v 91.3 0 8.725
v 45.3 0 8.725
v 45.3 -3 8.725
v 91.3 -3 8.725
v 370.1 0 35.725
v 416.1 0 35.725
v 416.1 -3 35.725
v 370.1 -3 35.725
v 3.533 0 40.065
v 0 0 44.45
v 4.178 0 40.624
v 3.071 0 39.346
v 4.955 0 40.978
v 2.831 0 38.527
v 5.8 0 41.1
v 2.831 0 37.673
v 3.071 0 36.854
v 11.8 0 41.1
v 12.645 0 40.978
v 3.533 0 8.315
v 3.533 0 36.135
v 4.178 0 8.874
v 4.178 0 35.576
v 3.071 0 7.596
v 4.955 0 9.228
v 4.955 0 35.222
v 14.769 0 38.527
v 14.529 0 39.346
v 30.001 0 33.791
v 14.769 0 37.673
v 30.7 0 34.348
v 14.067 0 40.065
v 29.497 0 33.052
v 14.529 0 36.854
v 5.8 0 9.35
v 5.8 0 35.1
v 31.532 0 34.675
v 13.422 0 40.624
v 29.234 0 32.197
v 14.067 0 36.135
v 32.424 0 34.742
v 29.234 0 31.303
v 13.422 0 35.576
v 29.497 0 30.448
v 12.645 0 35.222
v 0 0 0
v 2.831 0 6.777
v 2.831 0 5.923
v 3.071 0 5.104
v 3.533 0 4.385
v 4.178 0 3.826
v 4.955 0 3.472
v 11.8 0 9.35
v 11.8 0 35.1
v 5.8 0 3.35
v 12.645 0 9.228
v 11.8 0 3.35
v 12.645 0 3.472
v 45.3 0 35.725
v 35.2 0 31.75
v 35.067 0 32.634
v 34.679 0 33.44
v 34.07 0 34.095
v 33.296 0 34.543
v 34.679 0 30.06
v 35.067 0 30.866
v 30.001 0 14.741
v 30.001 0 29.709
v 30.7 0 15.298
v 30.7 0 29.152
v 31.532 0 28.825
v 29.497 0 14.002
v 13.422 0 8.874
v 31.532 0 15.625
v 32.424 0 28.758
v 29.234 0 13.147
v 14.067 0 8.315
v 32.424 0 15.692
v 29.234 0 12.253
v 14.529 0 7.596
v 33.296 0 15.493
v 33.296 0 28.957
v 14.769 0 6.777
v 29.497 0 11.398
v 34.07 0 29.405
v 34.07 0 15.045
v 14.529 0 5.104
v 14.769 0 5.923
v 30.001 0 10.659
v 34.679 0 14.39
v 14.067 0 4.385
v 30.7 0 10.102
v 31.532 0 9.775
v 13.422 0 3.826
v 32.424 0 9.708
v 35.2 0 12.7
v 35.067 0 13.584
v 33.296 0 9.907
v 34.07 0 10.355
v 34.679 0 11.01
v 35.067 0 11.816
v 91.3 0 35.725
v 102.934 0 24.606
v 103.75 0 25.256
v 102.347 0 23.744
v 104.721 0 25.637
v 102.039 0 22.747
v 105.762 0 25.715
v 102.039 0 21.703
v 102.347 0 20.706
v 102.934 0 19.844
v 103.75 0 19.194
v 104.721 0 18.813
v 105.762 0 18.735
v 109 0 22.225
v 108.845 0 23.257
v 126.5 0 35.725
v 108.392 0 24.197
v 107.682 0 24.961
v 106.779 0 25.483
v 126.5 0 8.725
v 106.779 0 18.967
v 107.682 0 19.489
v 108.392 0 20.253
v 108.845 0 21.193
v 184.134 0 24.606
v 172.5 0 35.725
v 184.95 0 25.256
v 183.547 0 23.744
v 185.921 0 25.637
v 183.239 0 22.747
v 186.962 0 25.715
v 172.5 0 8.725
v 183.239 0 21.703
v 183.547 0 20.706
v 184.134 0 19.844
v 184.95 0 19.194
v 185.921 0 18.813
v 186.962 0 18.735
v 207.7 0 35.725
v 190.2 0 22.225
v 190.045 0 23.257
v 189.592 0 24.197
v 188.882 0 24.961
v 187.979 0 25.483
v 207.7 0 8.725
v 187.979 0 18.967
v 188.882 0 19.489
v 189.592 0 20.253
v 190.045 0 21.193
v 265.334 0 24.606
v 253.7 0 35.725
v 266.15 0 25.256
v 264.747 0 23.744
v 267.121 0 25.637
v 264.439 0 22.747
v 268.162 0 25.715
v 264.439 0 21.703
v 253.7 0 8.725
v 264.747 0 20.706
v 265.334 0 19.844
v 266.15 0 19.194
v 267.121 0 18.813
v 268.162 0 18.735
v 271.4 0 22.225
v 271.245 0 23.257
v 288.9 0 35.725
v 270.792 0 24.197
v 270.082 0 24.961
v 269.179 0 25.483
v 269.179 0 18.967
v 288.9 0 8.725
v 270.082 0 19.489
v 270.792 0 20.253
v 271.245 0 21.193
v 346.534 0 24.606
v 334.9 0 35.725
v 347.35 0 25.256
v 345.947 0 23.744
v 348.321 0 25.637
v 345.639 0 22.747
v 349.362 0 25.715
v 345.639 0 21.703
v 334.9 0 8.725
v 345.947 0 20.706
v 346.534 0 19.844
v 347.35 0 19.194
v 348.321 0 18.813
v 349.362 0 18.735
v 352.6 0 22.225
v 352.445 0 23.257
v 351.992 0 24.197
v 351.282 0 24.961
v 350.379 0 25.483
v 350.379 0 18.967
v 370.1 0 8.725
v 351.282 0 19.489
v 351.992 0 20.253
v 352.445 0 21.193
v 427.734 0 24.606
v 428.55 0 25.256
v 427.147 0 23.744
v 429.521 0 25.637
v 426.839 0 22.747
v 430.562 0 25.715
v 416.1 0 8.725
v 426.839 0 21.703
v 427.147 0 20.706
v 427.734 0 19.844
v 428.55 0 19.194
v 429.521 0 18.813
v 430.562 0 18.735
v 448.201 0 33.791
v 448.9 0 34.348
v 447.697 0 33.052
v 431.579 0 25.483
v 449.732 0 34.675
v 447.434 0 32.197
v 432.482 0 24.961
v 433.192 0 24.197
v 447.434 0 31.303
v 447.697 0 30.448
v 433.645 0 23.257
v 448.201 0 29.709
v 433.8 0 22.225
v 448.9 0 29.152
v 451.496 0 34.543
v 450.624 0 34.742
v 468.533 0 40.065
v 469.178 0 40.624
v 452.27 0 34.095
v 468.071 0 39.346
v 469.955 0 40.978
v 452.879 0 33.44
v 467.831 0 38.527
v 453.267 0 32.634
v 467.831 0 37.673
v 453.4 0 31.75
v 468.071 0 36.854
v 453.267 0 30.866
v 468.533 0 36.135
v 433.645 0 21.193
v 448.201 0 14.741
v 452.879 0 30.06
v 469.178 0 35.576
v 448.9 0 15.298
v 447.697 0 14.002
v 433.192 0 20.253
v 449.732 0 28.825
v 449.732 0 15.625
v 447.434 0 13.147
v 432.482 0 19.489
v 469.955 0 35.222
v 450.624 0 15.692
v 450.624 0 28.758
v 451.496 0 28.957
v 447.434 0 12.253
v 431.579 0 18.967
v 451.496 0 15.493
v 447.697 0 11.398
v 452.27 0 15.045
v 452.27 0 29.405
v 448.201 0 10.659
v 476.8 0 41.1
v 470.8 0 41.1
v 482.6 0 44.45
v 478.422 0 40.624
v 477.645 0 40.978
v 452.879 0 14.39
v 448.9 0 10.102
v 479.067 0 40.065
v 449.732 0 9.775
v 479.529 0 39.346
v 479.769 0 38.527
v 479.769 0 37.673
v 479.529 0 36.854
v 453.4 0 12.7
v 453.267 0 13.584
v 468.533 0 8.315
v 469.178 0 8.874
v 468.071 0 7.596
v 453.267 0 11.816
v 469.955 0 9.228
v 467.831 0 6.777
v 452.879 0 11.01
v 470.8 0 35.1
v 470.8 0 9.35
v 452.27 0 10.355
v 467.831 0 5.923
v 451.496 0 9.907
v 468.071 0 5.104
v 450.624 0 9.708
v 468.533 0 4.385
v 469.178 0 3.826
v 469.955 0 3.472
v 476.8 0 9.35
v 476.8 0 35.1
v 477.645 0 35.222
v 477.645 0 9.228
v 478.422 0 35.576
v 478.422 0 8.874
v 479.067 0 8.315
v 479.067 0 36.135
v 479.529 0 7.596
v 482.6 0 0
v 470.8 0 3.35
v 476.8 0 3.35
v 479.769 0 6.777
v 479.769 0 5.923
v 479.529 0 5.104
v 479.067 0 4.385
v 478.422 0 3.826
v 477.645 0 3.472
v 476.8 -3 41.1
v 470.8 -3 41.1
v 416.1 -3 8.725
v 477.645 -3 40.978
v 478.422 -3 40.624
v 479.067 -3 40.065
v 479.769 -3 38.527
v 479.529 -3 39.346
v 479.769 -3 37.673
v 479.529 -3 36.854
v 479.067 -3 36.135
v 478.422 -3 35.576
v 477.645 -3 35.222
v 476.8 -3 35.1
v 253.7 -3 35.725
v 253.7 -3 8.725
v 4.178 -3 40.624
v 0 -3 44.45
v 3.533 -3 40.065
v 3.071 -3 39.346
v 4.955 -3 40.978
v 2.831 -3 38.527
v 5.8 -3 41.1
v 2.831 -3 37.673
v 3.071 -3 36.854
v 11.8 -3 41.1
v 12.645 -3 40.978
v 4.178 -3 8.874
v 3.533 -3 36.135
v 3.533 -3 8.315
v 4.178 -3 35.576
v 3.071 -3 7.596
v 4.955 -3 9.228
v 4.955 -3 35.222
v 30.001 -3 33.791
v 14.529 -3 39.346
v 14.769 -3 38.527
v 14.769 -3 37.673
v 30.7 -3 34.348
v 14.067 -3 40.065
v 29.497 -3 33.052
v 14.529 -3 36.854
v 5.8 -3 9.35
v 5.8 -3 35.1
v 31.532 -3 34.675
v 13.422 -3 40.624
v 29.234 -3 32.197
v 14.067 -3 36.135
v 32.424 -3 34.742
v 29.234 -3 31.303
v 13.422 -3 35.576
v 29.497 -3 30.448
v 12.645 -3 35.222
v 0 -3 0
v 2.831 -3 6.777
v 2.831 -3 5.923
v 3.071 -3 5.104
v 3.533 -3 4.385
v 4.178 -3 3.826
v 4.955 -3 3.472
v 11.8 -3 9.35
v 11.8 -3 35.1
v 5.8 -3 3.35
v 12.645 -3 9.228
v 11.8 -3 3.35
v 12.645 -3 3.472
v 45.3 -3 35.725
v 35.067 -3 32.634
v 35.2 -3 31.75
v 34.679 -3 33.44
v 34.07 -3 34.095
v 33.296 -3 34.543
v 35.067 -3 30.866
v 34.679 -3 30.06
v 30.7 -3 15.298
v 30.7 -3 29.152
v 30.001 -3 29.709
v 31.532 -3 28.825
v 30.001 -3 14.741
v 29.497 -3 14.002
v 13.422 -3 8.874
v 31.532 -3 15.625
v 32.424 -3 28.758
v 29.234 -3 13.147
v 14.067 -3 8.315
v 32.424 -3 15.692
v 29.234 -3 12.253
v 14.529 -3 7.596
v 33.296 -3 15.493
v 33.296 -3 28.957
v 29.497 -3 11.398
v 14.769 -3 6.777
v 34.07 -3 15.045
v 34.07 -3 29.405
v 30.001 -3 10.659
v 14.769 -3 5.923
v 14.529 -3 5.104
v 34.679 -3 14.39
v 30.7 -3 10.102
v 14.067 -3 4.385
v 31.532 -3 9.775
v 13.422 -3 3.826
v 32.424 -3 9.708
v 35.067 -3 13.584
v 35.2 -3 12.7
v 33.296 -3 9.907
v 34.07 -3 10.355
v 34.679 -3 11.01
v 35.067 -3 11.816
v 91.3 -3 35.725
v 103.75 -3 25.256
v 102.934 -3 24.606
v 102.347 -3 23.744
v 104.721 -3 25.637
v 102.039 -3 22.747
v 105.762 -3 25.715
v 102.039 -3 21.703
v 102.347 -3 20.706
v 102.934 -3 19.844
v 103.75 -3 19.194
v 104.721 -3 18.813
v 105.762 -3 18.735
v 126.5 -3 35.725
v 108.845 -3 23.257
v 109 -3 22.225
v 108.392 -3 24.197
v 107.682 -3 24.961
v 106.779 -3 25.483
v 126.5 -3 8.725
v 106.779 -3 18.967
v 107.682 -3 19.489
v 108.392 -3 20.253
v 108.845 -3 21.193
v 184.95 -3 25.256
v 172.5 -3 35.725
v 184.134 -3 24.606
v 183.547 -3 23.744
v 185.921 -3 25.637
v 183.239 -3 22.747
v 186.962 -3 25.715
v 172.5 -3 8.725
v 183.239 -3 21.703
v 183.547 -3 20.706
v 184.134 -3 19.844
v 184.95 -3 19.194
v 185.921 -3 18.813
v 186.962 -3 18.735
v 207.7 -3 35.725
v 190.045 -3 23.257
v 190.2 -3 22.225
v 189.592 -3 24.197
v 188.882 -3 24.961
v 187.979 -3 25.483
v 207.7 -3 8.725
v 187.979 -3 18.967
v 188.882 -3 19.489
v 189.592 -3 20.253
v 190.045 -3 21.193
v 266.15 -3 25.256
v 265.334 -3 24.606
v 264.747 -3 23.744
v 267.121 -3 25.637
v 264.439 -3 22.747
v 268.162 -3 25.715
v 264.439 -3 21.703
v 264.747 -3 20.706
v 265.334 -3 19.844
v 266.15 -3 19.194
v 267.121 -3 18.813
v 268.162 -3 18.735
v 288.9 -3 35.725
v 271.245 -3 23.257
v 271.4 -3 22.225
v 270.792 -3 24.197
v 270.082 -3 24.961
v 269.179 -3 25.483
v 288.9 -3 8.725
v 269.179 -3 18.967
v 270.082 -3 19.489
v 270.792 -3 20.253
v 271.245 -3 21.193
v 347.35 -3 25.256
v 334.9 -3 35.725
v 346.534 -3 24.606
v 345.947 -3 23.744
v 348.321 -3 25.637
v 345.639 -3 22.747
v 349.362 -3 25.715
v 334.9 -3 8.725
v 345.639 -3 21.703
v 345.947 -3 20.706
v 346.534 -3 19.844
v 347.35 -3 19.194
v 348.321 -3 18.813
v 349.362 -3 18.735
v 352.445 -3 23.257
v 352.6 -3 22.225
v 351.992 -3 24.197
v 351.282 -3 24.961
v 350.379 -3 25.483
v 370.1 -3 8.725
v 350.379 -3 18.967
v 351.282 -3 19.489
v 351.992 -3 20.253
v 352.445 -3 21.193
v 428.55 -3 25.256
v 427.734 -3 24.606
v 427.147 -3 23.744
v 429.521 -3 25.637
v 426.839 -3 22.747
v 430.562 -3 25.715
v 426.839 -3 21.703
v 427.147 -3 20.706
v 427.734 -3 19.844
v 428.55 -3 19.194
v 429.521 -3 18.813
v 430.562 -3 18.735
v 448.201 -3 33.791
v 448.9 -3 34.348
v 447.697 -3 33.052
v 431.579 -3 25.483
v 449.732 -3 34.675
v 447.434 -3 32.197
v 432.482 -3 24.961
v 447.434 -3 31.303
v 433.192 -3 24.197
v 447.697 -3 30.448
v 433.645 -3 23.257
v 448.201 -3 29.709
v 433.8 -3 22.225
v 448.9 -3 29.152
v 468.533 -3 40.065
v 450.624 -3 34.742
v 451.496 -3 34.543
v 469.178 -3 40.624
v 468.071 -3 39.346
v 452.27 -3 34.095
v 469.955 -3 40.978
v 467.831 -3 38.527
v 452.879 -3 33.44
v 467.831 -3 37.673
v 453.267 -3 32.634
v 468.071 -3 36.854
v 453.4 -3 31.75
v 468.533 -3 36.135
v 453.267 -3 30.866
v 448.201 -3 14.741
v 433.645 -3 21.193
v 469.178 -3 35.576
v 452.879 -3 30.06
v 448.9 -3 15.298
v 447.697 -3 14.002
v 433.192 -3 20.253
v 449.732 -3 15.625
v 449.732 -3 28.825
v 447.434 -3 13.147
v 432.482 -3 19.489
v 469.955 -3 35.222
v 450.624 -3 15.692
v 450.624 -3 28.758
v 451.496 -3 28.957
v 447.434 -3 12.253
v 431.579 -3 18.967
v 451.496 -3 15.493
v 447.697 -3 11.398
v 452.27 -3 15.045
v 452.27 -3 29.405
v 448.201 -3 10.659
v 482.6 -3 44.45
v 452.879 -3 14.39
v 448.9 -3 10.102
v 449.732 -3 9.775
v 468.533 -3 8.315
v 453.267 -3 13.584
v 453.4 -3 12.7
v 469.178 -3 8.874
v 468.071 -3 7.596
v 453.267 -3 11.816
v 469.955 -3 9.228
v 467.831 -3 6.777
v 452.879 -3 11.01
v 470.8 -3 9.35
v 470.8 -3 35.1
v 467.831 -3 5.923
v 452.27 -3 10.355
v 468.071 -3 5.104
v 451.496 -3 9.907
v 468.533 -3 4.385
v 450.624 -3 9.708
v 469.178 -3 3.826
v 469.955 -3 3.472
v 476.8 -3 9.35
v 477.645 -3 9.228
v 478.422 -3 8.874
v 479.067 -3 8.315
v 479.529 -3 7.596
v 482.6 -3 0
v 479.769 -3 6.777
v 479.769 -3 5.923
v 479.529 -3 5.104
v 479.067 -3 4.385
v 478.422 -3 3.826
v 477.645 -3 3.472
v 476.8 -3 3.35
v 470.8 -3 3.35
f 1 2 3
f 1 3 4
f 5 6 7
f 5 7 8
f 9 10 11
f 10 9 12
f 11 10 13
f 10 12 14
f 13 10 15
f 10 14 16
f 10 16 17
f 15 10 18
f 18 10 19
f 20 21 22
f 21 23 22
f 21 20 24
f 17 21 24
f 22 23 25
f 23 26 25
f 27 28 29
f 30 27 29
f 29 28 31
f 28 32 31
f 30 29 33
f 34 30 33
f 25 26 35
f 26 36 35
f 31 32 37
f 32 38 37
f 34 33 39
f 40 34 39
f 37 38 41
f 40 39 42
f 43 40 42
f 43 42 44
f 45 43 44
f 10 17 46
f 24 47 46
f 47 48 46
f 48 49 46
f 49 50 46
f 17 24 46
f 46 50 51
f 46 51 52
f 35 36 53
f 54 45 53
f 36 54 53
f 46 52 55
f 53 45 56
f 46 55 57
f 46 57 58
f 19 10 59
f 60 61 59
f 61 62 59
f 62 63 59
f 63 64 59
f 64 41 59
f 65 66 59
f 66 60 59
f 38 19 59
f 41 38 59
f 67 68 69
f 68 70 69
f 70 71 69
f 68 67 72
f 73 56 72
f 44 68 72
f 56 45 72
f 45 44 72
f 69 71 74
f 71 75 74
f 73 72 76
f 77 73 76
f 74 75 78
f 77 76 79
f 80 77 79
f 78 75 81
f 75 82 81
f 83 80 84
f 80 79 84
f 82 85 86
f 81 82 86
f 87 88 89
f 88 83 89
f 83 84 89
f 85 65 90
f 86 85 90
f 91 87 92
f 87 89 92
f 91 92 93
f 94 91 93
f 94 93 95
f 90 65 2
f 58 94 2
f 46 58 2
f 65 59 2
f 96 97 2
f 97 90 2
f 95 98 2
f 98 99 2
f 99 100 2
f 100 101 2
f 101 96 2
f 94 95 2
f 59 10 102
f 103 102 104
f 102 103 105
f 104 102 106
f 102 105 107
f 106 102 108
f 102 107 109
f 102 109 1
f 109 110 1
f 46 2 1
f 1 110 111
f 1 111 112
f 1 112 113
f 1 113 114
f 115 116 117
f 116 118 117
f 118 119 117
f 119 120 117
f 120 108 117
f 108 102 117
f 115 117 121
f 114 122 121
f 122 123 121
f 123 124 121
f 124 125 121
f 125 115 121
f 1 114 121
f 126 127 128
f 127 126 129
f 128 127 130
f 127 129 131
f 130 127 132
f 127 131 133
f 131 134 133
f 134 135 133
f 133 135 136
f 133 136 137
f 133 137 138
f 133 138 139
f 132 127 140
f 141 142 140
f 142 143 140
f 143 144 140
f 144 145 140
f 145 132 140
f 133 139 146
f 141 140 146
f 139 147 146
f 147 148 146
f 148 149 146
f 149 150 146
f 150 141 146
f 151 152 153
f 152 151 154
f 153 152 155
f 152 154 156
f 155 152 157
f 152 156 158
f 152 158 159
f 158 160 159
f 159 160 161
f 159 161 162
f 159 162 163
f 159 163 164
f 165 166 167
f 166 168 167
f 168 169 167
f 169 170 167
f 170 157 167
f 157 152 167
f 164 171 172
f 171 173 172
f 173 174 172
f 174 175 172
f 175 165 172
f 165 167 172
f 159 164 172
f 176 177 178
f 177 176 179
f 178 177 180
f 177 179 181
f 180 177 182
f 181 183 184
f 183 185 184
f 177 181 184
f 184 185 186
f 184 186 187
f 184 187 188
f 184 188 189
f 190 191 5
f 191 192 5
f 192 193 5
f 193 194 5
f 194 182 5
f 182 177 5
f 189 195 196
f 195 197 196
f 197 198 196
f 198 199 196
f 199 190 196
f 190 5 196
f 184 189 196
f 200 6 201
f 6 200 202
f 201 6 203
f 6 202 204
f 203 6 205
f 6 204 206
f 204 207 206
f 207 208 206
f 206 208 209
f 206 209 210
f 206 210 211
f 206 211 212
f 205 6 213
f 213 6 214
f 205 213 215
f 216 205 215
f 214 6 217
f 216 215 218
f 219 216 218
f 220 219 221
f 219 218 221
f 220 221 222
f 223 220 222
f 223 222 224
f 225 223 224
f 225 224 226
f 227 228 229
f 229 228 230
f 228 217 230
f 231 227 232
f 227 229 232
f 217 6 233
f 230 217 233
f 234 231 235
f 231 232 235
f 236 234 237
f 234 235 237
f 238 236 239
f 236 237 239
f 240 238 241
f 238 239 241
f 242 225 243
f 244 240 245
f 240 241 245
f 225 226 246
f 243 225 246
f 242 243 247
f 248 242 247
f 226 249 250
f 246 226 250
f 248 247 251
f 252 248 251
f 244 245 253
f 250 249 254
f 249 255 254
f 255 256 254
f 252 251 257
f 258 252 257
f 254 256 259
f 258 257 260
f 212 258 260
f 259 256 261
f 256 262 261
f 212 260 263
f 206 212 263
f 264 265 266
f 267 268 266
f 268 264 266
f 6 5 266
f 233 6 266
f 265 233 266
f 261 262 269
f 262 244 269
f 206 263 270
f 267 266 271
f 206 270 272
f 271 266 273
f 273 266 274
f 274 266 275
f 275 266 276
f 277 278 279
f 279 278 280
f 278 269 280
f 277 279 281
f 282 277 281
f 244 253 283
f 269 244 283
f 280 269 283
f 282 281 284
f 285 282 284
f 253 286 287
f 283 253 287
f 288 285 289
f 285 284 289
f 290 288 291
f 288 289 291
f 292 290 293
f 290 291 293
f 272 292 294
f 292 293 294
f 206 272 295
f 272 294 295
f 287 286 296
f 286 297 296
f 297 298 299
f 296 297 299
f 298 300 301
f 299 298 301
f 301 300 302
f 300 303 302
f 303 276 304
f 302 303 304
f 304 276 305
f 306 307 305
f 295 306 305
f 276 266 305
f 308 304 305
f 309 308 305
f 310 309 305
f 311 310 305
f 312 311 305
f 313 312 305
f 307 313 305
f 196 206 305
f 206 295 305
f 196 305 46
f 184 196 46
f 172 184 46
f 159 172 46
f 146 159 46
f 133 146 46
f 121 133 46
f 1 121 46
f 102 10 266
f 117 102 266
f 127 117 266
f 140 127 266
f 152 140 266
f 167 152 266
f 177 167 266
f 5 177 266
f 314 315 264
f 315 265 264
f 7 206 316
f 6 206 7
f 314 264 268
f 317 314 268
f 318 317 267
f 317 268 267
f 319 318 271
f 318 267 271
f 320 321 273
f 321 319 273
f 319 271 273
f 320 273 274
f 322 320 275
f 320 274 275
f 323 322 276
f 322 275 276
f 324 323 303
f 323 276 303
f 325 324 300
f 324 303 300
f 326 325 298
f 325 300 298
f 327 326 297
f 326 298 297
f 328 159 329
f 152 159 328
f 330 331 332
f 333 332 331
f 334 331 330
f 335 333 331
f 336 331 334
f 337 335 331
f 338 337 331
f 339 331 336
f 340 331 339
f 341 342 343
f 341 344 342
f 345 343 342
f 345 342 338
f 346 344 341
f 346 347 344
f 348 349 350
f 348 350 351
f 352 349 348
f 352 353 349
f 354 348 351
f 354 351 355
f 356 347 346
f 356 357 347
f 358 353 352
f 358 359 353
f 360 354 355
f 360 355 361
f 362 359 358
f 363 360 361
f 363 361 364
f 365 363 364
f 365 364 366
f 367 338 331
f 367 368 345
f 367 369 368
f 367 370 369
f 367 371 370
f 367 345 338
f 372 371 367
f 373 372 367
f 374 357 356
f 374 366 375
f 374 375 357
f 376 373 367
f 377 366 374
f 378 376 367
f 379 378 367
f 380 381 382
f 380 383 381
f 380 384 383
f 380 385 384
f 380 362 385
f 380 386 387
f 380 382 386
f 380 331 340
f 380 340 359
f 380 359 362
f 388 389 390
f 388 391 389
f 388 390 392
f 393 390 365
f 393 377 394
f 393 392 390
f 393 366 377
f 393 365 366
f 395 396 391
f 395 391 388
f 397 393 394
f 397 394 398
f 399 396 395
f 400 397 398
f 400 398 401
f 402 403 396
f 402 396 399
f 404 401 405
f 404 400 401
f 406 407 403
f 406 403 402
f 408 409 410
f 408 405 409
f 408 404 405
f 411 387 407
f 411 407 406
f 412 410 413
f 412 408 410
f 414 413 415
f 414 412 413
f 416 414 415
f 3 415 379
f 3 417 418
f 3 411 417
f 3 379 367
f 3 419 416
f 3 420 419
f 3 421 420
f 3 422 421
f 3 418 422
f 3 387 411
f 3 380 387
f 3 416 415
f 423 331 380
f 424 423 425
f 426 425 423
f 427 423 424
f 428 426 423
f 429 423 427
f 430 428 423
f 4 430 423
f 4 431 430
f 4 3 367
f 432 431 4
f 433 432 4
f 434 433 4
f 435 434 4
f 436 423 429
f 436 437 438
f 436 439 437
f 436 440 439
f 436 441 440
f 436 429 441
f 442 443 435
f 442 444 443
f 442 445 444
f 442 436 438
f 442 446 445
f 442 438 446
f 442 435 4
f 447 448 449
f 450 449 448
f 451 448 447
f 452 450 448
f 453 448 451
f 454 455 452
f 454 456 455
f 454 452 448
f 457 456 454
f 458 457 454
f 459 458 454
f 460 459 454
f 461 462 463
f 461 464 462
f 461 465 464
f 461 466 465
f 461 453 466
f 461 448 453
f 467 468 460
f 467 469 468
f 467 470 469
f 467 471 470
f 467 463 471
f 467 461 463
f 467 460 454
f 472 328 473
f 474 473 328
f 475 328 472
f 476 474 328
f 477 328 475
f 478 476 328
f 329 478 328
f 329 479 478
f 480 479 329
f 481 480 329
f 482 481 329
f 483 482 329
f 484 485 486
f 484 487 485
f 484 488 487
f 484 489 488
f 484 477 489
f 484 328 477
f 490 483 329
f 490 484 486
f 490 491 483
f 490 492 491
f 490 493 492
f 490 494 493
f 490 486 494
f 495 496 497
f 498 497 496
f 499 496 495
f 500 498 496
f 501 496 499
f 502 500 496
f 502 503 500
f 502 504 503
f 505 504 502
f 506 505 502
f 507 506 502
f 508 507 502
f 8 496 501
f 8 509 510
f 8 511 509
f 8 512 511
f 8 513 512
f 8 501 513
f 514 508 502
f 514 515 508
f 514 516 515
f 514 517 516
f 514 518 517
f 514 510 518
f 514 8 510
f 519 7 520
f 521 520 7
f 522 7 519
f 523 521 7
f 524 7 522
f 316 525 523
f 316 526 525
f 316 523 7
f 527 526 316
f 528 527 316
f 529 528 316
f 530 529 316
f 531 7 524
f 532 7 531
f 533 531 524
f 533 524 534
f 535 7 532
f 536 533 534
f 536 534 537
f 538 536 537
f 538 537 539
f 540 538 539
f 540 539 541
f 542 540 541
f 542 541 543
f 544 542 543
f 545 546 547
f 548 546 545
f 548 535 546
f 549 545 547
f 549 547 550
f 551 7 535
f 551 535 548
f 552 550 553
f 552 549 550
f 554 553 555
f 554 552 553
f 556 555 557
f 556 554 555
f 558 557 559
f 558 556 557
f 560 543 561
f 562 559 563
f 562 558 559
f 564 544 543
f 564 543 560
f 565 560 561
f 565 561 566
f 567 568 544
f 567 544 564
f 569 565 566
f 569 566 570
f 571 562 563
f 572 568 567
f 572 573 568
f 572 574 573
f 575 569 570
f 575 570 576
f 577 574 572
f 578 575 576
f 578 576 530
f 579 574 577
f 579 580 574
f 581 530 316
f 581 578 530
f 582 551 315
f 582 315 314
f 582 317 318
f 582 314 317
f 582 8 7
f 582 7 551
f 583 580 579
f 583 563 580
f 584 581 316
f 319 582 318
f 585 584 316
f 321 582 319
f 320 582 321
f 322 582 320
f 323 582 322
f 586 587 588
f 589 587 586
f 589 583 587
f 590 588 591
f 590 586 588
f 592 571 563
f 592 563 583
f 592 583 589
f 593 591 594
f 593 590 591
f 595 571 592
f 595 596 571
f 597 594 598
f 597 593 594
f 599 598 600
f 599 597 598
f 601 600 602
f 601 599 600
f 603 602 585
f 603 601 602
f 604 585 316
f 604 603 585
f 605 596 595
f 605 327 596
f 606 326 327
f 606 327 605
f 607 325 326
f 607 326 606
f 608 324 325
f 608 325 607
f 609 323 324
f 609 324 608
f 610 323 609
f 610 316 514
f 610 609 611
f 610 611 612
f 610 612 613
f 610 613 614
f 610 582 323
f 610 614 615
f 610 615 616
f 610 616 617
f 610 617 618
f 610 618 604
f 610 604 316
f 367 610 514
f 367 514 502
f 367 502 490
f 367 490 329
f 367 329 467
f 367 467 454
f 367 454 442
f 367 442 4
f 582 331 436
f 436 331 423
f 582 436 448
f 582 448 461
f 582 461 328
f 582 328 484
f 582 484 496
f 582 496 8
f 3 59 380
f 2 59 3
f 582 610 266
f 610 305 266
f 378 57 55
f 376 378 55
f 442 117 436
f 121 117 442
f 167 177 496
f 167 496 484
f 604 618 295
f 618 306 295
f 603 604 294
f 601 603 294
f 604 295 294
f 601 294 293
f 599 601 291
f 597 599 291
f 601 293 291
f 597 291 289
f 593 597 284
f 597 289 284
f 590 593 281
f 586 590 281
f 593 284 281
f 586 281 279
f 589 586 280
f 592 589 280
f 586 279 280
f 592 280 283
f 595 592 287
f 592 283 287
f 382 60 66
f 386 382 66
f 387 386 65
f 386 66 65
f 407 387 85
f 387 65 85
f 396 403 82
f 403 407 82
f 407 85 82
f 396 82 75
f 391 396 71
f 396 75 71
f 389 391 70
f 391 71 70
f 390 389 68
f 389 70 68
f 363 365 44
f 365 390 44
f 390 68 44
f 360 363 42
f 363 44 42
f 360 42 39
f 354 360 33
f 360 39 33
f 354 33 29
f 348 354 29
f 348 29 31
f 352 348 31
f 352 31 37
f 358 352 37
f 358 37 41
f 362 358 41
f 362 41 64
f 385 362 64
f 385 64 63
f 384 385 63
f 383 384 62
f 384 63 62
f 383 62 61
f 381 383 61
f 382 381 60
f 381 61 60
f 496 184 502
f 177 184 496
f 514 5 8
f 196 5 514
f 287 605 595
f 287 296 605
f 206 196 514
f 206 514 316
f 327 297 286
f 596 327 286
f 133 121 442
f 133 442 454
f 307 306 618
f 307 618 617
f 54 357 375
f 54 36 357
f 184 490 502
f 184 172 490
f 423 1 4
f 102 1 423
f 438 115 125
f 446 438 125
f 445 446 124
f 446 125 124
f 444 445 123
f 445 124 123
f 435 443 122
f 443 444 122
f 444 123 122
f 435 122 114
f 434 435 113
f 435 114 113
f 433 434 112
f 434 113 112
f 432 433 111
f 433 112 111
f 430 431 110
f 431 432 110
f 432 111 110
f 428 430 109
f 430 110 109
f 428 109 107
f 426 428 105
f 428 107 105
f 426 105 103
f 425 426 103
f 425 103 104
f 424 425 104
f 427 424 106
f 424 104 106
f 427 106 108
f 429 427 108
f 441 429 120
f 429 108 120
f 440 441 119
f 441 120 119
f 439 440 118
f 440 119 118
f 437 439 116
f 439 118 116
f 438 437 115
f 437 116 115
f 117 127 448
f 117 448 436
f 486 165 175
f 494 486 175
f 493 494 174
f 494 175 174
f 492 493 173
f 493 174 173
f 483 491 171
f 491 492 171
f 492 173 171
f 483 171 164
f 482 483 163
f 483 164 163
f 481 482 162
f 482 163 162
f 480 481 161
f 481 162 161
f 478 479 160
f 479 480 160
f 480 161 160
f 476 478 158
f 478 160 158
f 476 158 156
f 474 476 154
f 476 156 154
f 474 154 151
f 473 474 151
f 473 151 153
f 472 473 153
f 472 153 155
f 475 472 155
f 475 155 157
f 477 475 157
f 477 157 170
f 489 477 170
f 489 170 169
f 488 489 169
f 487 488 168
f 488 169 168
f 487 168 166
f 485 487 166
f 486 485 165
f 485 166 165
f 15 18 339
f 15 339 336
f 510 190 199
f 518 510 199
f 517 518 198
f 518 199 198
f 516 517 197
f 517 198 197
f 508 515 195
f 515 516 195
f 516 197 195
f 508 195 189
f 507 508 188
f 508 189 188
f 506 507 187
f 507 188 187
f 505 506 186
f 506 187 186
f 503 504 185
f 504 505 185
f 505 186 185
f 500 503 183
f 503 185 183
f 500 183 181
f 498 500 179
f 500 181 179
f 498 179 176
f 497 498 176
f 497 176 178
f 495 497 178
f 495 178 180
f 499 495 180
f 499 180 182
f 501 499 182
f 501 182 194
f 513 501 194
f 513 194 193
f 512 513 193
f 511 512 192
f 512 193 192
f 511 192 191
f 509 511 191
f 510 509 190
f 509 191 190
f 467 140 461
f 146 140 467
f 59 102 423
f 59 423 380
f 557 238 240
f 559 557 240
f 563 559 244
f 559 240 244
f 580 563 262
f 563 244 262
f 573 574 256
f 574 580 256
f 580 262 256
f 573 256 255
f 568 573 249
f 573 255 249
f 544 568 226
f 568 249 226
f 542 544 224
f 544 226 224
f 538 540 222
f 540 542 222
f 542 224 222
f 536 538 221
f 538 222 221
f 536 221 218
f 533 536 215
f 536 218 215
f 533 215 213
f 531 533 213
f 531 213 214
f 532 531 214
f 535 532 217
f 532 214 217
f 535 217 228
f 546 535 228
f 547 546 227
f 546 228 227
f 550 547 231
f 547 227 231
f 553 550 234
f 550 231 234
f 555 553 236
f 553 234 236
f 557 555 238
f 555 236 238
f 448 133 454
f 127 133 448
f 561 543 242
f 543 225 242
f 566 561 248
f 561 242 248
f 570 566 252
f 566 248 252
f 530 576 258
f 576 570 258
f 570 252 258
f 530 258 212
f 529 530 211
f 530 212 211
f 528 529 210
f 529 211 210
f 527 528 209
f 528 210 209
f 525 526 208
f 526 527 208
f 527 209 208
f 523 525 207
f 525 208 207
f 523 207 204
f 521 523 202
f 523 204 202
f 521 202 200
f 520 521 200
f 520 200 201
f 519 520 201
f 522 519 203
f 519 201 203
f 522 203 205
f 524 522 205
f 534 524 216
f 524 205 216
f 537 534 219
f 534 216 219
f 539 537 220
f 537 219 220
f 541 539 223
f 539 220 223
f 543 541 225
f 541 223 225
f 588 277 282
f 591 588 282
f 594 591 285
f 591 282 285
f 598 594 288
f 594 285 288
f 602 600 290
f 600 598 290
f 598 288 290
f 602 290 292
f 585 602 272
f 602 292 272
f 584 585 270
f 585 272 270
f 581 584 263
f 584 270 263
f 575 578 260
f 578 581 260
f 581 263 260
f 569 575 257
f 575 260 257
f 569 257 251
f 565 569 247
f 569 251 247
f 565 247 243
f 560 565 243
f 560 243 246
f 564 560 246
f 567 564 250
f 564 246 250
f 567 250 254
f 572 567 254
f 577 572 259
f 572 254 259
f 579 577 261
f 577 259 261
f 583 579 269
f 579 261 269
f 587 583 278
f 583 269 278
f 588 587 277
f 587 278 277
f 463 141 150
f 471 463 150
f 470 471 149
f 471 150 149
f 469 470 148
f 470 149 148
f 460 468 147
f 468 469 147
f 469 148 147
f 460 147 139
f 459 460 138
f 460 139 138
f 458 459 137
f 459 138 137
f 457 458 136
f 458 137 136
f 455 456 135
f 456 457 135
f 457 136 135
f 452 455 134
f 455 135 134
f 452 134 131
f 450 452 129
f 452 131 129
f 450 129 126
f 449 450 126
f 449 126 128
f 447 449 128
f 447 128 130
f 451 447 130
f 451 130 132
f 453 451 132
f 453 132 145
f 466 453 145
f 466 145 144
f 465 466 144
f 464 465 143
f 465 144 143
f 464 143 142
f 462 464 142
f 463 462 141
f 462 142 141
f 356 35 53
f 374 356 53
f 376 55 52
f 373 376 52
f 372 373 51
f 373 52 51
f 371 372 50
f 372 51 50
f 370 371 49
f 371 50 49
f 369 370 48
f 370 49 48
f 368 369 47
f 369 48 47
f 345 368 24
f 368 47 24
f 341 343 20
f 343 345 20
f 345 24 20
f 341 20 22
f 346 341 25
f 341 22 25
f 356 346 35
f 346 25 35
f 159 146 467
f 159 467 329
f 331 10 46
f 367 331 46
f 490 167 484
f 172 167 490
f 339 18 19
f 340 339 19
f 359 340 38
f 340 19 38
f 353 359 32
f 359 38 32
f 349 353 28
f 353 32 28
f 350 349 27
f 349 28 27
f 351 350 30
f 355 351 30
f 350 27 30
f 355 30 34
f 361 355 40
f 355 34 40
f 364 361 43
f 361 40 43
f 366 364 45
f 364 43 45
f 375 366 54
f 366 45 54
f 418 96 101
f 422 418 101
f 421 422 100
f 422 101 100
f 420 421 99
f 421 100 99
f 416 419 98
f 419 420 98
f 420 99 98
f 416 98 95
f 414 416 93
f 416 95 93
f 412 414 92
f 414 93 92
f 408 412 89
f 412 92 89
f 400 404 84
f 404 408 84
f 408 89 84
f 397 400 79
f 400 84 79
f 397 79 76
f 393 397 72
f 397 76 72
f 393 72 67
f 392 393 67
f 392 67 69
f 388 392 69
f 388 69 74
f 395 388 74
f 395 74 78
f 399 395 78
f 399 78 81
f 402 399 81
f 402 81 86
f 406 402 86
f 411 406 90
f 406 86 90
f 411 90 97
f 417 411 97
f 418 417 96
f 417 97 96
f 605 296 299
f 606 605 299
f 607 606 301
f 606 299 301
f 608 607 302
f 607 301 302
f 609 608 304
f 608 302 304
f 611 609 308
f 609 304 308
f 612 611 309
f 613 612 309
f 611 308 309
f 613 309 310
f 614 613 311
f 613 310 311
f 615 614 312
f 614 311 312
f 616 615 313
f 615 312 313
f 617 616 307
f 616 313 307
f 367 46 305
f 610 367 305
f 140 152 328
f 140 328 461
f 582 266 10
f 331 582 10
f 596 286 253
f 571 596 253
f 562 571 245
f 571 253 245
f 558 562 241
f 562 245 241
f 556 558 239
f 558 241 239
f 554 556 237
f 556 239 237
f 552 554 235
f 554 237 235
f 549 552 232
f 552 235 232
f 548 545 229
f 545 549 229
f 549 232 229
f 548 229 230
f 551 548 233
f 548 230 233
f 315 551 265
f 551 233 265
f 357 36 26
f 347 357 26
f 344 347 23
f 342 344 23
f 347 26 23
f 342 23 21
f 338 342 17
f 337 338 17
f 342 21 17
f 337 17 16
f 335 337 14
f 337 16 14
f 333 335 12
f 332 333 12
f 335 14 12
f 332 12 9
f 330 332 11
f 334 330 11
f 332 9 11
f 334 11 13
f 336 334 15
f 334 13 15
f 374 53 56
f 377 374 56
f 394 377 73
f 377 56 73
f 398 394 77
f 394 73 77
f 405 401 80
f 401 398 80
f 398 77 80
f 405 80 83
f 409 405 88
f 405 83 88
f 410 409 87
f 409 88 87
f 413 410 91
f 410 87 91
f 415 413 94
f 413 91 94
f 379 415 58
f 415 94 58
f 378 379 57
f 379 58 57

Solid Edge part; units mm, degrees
sketch "Sketch1" plane through (0, 0, 0) normal (0, -1, 0) x (1, 0, 0)
  line L0 (5.8, 35.1) -> (11.8, 35.1)
  arc A0 (11.8, 41.1) -> (11.8, 35.1) centre (11.8, 38.1) cw
  line L1 (11.8, 41.1) -> (5.8, 41.1)
  arc A1 (5.8, 35.1) -> (5.8, 41.1) centre (5.8, 38.1) cw
  line L2 (482.6, 44.45) -> (0, 44.45)
  line L3 (0, 44.45) -> (0, 0)
  line L4 (0, 0) -> (482.6, 0)
  line L5 (482.6, 0) -> (482.6, 44.45)
  arc A2 (5.8, 9.35) -> (5.8, 3.35) centre (5.8, 6.35) ccw
  line L6 (11.8, 3.35) -> (5.8, 3.35)
  arc A3 (11.8, 3.35) -> (11.8, 9.35) centre (11.8, 6.35) ccw
  line L7 (5.8, 9.35) -> (11.8, 9.35)
  circle A4 centre (32.2, 12.7) radius 3
  circle A5 centre (32.2, 31.75) radius 3
  circle A6 centre (105.5, 22.225) radius 3.5
  line L8 (45.3, 8.725) -> (91.3, 8.725)
  line L9 (91.3, 8.725) -> (91.3, 35.725)
  line L10 (91.3, 35.725) -> (45.3, 35.725)
  line L11 (45.3, 35.725) -> (45.3, 8.725)
  line L12 (126.5, 35.725) -> (126.5, 8.725)
  line L13 (126.5, 8.725) -> (172.5, 8.725)
  line L14 (172.5, 8.725) -> (172.5, 35.725)
  line L15 (172.5, 35.725) -> (126.5, 35.725)
  circle A7 centre (186.7, 22.225) radius 3.5
  circle A8 centre (267.9, 22.225) radius 3.5
  line L16 (207.7, 35.725) -> (207.7, 8.725)
  line L17 (207.7, 8.725) -> (253.7, 8.725)
  line L18 (253.7, 8.725) -> (253.7, 35.725)
  line L19 (253.7, 35.725) -> (207.7, 35.725)
  line L20 (288.9, 35.725) -> (288.9, 8.725)
  line L21 (288.9, 8.725) -> (334.9, 8.725)
  line L22 (334.9, 8.725) -> (334.9, 35.725)
  line L23 (334.9, 35.725) -> (288.9, 35.725)
  circle A9 centre (349.1, 22.225) radius 3.5
  line L24 (370.1, 35.725) -> (370.1, 8.725)
  line L25 (370.1, 8.725) -> (416.1, 8.725)
  line L26 (416.1, 8.725) -> (416.1, 35.725)
  line L27 (416.1, 35.725) -> (370.1, 35.725)
  circle A10 centre (430.3, 22.225) radius 3.5
  arc A11 (476.8, 35.1) -> (476.8, 41.1) centre (476.8, 38.1) ccw
  line L28 (470.8, 41.1) -> (476.8, 41.1)
  arc A12 (470.8, 41.1) -> (470.8, 35.1) centre (470.8, 38.1) ccw
  line L29 (476.8, 35.1) -> (470.8, 35.1)
  circle A13 centre (450.4, 31.75) radius 3
  line L30 (470.8, 3.35) -> (476.8, 3.35)
  arc A14 (476.8, 9.35) -> (476.8, 3.35) centre (476.8, 6.35) cw
  line L31 (476.8, 9.35) -> (470.8, 9.35)
  arc A15 (470.8, 3.35) -> (470.8, 9.35) centre (470.8, 6.35) cw
  circle A16 centre (450.4, 12.7) radius 3
  dimension "D1" = 482.6
  dimension "D2" = 44.45
  dimension "D3" = 6
  dimension "D4" = 6.35
  dimension "D5" = 12.7
  dimension "D6" = 32.2
  dimension "D7" = 8.8
  dimension "D8" = 406
  dimension "D9" = 81.2
  dimension "D10" = 81.2
  dimension "D11" = 81.2
  dimension "D12" = 81.2
  dimension "D13" = 48
  dimension "D14" = 46
  dimension "D15" = 27
  dimension "D16" = 29
  dimension "D17" = 6
  dimension "D18" = 14
  dimension "D19" = 14
  dimension "D20" = 14
  dimension "D21" = 14
  dimension "D22" = 14
  dimension "D23" = 48
  dimension "D24" = 46
  dimension "D25" = 27
  dimension "D26" = 29
  dimension "D27" = 48
  dimension "D28" = 46
  dimension "D29" = 27
  dimension "D30" = 29
  dimension "D31" = 48
  dimension "D32" = 46
  dimension "D33" = 27
  dimension "D34" = 29
  dimension "D35" = 48
  dimension "D36" = 46
  dimension "D37" = 27
  dimension "D38" = 29
  dimension "D39" = 7.725
  dimension "D40" = 7
  dimension "D41" = 16
  dimension "D42" = 7
  dimension "D43" = 16
  dimension "D44" = 7
  dimension "D45" = 16
  dimension "D46" = 7
  dimension "D47" = 16
  dimension "D48" = 7
  dimension "D49" = 16
  dimension "D50" = 6
  dimension "D51" = 7.725
  dimension "D52" = 6
  dimension "D53" = 7.725
  dimension "D54" = 6
  dimension "D55" = 7.725
  dimension "D56" = 6
  dimension "D57" = 7.725
extrude "Protrusion1" add sketch "Sketch1" along normal blind 3
